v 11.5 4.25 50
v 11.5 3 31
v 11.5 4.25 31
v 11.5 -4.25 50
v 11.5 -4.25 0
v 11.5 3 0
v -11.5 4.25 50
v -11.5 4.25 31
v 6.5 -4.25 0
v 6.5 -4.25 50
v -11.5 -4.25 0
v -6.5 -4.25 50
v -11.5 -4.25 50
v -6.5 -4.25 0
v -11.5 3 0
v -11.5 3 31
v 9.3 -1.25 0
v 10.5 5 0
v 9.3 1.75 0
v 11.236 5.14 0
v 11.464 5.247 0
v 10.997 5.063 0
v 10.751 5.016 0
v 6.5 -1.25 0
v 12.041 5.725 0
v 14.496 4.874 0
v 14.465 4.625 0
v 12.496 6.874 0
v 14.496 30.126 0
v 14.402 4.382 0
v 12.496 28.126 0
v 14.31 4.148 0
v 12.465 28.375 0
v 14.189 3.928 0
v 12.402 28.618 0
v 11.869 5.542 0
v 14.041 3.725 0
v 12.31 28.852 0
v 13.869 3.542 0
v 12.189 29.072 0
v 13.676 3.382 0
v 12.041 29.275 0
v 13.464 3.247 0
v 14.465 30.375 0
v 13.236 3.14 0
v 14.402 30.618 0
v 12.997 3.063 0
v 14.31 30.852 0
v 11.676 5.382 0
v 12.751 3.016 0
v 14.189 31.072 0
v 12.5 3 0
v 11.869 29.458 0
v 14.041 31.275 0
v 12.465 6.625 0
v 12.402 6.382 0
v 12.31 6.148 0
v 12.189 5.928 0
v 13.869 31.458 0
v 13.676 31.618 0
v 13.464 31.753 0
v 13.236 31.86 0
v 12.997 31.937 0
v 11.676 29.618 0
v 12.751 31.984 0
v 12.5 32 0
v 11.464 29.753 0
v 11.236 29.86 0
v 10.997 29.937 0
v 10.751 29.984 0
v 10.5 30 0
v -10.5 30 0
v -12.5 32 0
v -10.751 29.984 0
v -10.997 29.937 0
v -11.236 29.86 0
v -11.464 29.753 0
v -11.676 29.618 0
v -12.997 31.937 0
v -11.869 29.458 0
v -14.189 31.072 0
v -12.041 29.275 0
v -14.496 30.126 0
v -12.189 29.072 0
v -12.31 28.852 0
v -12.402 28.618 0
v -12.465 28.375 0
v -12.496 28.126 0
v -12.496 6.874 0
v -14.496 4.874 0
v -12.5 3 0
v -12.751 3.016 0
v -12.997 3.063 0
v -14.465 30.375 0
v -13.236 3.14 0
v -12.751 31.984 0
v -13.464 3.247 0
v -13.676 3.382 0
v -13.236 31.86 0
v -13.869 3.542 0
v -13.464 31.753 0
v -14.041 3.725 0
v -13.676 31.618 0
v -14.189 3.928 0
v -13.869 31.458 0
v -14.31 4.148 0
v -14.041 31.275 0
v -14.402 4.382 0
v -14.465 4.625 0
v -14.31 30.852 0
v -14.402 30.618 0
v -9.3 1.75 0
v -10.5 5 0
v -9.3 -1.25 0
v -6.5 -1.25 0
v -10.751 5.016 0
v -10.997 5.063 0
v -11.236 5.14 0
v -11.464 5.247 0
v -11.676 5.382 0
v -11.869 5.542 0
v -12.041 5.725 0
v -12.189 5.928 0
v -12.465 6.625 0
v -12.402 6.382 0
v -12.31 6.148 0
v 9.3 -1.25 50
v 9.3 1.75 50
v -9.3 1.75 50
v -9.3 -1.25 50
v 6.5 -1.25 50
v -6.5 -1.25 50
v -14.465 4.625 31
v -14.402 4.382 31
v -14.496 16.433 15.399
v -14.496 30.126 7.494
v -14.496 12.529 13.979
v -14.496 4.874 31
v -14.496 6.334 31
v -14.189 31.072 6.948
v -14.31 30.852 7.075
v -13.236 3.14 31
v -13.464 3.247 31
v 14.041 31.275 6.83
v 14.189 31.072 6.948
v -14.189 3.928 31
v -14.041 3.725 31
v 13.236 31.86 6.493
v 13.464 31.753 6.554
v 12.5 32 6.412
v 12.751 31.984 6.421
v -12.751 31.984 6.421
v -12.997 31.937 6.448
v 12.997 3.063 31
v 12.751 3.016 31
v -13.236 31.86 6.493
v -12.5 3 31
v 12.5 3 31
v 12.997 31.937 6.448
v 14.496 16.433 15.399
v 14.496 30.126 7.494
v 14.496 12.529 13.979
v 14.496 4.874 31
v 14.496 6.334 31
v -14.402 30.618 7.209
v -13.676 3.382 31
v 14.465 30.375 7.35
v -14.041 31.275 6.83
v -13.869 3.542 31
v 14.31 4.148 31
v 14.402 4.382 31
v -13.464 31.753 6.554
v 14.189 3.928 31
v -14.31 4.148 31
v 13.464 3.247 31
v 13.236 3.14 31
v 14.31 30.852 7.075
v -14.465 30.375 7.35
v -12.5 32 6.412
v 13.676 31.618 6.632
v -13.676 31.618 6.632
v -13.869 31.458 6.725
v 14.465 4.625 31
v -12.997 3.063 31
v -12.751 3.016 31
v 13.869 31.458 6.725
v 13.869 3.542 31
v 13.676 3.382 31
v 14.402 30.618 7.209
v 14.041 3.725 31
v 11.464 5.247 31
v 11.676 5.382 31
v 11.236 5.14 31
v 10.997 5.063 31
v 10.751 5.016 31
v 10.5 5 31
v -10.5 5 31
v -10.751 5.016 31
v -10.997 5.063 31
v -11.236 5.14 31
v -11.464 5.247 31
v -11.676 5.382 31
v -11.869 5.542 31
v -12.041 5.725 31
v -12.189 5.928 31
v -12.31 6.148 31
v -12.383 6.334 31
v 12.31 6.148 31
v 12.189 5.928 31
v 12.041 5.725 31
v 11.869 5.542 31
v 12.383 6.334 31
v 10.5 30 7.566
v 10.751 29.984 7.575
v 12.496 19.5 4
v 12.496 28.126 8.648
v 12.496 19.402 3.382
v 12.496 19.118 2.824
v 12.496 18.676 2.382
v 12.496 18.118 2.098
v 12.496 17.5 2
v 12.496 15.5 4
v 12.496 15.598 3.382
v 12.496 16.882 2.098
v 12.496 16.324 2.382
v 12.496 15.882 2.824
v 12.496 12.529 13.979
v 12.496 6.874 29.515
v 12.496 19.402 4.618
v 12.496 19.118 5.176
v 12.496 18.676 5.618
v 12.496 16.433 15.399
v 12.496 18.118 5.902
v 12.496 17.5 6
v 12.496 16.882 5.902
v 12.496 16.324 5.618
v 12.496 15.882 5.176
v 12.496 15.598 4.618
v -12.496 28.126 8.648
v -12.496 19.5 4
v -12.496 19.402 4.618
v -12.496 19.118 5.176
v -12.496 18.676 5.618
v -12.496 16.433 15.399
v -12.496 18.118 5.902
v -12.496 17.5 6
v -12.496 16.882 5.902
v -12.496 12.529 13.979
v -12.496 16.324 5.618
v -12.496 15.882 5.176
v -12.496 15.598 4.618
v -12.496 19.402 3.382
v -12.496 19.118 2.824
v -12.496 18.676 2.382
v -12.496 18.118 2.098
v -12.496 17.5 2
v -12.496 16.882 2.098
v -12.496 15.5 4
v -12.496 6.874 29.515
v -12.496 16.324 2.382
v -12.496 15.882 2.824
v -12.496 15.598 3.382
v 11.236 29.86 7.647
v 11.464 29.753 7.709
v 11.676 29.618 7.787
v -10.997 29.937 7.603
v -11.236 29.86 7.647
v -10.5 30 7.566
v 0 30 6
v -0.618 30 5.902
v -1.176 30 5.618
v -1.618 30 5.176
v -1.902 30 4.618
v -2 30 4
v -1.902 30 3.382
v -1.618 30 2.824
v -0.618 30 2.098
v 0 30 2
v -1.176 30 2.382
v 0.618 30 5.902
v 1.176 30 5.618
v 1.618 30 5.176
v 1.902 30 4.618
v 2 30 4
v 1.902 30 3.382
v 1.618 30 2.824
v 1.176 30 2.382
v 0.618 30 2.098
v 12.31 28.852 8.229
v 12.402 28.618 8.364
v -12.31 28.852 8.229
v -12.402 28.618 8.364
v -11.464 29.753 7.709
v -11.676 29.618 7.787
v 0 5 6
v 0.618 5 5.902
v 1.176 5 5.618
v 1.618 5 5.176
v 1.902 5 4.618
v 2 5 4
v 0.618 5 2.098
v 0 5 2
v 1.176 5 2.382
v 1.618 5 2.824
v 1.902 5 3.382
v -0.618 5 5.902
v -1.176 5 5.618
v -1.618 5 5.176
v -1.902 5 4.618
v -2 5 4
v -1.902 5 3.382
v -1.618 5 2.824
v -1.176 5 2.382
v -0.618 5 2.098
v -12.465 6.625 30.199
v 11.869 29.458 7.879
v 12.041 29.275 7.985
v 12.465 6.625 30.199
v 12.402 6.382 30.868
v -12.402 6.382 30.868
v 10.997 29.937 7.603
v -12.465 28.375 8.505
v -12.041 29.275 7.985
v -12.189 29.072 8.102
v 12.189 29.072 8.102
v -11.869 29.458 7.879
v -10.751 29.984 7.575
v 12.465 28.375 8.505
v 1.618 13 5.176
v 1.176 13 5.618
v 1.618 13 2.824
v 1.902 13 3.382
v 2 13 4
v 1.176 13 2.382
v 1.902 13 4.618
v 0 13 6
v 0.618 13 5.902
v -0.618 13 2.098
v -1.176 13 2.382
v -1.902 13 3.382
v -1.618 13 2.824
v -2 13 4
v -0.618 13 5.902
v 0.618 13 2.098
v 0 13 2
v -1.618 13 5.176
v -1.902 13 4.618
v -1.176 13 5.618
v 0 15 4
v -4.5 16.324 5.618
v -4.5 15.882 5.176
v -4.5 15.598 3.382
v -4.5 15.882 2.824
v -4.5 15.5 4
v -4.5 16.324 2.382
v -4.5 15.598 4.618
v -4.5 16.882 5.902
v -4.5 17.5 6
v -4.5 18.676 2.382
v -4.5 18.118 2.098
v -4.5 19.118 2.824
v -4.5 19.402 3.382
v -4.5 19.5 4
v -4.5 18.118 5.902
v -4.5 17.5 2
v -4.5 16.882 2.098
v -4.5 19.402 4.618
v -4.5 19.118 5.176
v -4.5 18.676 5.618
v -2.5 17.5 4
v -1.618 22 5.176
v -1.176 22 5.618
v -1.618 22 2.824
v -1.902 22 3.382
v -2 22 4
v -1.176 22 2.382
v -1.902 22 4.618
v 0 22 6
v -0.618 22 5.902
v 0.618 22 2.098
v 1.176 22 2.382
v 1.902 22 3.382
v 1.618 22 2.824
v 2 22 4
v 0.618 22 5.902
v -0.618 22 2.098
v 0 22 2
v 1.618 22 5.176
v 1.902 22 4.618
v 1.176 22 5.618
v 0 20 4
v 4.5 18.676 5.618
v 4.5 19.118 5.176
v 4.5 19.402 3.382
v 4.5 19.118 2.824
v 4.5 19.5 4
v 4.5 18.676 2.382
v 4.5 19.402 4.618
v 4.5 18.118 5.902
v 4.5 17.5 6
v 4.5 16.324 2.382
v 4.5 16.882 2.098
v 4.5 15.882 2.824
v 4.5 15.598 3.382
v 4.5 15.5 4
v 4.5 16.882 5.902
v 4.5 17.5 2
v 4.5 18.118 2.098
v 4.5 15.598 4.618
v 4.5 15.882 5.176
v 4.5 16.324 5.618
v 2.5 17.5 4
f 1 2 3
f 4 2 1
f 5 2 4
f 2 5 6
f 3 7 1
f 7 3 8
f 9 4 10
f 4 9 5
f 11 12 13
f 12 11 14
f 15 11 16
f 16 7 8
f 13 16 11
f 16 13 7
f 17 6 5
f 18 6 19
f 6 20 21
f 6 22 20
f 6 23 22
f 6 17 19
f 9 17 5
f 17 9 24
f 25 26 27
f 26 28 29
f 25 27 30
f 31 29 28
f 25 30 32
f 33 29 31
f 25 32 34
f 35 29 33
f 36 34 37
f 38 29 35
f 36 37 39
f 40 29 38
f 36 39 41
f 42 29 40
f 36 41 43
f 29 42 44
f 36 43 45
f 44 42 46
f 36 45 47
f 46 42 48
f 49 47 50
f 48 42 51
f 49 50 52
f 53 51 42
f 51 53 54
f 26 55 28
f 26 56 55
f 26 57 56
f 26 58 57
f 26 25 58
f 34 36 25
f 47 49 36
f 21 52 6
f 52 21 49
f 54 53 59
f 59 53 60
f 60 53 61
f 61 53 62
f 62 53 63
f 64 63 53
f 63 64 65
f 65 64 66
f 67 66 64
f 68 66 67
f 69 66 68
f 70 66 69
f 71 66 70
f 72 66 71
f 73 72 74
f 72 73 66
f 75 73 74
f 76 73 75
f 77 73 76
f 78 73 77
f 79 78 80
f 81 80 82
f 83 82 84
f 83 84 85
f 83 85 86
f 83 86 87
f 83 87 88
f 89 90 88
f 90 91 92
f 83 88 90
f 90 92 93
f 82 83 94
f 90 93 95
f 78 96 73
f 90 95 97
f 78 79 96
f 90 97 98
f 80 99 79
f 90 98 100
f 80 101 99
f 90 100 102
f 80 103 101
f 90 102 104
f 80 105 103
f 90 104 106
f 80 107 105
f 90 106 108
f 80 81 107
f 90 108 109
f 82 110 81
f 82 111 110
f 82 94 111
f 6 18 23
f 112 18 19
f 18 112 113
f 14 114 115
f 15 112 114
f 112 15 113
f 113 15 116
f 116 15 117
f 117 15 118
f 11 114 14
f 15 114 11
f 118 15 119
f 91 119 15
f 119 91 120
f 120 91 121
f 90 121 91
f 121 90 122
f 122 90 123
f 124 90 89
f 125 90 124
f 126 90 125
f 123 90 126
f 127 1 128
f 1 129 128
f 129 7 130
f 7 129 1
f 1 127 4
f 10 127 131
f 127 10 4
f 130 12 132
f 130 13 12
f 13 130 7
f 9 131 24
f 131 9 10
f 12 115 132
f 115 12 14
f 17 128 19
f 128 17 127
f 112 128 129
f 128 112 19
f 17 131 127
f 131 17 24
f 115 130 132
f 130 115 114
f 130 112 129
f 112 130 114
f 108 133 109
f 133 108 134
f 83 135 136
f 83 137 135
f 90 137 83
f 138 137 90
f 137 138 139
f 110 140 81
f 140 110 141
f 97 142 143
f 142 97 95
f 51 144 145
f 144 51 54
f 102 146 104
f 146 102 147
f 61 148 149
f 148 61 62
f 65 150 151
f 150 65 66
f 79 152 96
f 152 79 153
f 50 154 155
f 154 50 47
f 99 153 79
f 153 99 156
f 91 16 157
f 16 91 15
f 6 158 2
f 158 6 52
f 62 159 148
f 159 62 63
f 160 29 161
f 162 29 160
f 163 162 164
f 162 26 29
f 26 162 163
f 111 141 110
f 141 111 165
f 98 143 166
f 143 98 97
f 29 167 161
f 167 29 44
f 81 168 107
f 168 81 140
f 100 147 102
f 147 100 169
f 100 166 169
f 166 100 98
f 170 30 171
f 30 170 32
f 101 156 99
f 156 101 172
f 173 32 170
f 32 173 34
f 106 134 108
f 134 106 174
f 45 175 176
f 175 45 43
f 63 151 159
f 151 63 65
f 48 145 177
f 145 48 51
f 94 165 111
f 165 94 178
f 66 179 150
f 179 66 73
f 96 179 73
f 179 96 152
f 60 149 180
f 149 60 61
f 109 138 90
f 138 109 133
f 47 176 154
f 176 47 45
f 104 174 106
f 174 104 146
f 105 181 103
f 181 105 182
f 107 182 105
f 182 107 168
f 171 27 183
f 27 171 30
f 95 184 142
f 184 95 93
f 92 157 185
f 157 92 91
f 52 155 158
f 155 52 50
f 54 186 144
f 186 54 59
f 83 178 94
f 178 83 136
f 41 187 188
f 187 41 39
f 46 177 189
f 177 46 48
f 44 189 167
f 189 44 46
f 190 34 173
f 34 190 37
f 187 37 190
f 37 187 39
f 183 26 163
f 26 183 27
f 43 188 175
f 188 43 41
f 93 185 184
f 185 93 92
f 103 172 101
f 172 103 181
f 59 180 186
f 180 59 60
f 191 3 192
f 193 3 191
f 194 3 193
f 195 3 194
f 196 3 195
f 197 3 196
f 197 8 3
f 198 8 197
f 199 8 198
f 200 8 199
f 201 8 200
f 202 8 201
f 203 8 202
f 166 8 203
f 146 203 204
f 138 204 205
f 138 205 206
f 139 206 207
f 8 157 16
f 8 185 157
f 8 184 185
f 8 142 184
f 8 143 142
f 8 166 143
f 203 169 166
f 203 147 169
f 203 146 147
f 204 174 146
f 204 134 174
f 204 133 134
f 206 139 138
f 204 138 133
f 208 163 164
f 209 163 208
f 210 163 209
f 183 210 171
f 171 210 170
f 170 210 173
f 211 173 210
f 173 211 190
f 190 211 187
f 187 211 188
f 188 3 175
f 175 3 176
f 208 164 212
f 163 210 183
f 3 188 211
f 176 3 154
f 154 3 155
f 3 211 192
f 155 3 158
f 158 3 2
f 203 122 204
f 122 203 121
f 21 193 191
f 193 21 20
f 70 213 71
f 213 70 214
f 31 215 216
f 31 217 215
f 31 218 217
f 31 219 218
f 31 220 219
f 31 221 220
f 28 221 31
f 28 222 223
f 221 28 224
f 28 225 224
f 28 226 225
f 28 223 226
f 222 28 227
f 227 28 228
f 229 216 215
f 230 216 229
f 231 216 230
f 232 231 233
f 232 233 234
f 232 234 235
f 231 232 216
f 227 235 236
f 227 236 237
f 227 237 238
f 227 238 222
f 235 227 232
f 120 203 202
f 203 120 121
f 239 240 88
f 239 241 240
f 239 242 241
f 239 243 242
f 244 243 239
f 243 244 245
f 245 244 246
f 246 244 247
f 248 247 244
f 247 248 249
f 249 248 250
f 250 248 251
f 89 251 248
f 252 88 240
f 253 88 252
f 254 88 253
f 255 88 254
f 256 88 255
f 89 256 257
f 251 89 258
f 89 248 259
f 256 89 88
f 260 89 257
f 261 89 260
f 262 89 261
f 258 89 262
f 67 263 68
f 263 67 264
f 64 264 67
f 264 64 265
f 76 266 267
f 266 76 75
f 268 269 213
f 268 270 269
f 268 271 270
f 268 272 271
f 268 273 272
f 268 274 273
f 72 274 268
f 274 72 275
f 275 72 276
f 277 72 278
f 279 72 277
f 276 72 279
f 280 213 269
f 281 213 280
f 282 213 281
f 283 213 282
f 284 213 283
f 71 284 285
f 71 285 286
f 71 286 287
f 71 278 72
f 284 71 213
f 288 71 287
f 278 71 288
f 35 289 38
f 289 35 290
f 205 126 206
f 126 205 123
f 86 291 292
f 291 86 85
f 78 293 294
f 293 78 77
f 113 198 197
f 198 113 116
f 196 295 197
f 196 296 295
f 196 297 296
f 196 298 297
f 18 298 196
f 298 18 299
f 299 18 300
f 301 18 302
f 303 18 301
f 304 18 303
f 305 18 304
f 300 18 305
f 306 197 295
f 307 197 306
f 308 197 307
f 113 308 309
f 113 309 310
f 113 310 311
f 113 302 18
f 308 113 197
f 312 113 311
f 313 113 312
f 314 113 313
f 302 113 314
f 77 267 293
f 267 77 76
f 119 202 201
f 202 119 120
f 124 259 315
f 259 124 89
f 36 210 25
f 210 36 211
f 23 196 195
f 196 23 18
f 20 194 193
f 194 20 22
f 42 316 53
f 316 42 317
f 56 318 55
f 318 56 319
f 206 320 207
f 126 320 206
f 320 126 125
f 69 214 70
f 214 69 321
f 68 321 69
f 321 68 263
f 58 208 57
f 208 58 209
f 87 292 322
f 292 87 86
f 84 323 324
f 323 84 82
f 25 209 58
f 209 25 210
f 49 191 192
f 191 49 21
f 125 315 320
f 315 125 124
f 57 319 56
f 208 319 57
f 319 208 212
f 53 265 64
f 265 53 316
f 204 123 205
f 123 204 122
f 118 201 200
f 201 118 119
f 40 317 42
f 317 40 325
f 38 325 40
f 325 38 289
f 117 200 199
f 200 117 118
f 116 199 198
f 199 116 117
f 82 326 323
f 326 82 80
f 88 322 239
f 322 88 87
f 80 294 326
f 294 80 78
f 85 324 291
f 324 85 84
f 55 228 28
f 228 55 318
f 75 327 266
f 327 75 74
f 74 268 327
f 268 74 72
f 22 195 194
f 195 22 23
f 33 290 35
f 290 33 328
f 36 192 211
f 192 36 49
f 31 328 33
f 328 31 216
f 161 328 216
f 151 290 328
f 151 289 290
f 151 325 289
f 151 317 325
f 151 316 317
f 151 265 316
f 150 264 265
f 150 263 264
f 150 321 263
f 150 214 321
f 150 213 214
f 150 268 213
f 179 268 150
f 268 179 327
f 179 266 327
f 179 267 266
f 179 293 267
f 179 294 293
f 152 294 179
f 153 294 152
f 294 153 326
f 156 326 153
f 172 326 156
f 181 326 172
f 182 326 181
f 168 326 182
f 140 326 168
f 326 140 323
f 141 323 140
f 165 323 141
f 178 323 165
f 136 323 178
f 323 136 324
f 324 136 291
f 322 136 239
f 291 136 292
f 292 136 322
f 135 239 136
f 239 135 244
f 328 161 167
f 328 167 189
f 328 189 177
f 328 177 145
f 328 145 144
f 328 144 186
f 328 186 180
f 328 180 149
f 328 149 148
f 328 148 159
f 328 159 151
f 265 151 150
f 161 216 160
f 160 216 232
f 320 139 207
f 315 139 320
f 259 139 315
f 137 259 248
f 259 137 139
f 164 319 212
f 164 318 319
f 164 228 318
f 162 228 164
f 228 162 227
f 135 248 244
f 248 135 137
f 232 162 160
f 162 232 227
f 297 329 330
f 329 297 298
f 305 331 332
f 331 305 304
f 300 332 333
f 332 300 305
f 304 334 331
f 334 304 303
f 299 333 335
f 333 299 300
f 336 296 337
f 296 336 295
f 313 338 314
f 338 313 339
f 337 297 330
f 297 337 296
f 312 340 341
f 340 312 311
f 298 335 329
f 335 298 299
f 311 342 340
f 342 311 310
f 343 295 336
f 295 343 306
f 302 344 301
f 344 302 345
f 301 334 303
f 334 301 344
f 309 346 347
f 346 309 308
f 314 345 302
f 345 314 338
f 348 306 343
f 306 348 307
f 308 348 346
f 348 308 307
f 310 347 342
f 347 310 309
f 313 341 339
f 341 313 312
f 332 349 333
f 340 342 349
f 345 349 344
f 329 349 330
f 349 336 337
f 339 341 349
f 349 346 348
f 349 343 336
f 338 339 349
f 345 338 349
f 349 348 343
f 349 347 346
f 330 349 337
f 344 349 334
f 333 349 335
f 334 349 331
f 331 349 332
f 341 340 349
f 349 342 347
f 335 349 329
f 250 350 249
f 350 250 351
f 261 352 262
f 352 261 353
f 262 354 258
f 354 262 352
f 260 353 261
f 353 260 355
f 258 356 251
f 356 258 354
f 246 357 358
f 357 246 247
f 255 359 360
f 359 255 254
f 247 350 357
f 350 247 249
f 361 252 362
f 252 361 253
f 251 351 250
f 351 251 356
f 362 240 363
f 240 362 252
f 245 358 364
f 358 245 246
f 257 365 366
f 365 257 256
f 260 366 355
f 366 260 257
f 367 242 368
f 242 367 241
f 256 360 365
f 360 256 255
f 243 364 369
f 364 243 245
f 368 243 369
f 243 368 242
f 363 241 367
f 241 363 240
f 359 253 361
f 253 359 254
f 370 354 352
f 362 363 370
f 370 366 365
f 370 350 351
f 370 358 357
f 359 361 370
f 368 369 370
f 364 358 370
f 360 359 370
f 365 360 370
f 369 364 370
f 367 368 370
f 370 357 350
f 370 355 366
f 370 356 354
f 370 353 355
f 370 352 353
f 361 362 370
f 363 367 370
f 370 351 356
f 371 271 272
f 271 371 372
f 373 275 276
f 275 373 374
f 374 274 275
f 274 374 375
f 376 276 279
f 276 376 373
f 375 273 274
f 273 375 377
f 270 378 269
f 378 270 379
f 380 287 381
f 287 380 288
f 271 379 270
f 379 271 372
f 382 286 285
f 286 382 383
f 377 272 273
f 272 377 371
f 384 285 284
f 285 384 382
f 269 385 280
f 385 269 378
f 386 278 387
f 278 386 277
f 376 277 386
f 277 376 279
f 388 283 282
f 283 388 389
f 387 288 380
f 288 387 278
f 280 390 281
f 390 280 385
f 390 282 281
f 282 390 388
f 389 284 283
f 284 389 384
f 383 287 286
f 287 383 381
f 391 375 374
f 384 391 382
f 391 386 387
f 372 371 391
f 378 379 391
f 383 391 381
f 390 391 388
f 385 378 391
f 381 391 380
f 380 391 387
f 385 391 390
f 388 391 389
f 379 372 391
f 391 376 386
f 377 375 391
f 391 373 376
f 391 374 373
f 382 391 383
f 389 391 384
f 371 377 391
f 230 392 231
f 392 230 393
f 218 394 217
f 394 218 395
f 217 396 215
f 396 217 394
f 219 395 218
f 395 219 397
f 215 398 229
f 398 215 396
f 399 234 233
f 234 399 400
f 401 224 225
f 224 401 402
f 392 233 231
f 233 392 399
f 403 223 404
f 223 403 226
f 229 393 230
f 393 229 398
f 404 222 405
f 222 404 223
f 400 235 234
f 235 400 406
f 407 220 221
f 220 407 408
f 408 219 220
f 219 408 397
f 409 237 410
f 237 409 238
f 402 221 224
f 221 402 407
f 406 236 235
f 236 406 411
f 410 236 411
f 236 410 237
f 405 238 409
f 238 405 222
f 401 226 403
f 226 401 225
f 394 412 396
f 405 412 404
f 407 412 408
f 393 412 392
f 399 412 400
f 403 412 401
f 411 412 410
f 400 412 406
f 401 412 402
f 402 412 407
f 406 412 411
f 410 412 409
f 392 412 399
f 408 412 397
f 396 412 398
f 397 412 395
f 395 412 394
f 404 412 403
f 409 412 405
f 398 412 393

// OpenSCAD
module pick(){
  cylinder(d=4,h=8, $fn=20);
  translate([0,0,8]) cylinder(r1=2, r2=0,h=2, $fn=20);
}

translate([0,0,25]) rotate([-90,0,0])
union(){
difference(){
  cube([23,50,8.5],center=true);
  translate([0,0,-2]) cube([13,50,6.5],center=true);
  translate([0,0,0.25]) cube([18.6,50,3],center=true);
}

difference(){
  translate([0,9,17.5])
    minkowski(){
      cube([25,30,25],center=true);
      rotate([0,90,90]) cylinder(r=2,h=1, $fn=50);
    }
  translate([0,9,17.5])
    minkowski(){
      cube([21,31,21],center=true);
      rotate([0,90,90]) cylinder(r=2,h=1, $fn=50);
    }
  translate([0,3,30]) rotate([60,0,0]) cube([30,25,25], center=true);
  translate([0,-5,20]) rotate([20,0,0]) cube([30,25,25], center=true);
}

translate([0,21,5]) pick();
translate([-12.5,21,17.5]) rotate([0,90,0]) pick();
translate([0,21,30]) rotate([0,180,0]) pick();
translate([12.5,21,17.5]) rotate([0,270,0]) pick();
}
